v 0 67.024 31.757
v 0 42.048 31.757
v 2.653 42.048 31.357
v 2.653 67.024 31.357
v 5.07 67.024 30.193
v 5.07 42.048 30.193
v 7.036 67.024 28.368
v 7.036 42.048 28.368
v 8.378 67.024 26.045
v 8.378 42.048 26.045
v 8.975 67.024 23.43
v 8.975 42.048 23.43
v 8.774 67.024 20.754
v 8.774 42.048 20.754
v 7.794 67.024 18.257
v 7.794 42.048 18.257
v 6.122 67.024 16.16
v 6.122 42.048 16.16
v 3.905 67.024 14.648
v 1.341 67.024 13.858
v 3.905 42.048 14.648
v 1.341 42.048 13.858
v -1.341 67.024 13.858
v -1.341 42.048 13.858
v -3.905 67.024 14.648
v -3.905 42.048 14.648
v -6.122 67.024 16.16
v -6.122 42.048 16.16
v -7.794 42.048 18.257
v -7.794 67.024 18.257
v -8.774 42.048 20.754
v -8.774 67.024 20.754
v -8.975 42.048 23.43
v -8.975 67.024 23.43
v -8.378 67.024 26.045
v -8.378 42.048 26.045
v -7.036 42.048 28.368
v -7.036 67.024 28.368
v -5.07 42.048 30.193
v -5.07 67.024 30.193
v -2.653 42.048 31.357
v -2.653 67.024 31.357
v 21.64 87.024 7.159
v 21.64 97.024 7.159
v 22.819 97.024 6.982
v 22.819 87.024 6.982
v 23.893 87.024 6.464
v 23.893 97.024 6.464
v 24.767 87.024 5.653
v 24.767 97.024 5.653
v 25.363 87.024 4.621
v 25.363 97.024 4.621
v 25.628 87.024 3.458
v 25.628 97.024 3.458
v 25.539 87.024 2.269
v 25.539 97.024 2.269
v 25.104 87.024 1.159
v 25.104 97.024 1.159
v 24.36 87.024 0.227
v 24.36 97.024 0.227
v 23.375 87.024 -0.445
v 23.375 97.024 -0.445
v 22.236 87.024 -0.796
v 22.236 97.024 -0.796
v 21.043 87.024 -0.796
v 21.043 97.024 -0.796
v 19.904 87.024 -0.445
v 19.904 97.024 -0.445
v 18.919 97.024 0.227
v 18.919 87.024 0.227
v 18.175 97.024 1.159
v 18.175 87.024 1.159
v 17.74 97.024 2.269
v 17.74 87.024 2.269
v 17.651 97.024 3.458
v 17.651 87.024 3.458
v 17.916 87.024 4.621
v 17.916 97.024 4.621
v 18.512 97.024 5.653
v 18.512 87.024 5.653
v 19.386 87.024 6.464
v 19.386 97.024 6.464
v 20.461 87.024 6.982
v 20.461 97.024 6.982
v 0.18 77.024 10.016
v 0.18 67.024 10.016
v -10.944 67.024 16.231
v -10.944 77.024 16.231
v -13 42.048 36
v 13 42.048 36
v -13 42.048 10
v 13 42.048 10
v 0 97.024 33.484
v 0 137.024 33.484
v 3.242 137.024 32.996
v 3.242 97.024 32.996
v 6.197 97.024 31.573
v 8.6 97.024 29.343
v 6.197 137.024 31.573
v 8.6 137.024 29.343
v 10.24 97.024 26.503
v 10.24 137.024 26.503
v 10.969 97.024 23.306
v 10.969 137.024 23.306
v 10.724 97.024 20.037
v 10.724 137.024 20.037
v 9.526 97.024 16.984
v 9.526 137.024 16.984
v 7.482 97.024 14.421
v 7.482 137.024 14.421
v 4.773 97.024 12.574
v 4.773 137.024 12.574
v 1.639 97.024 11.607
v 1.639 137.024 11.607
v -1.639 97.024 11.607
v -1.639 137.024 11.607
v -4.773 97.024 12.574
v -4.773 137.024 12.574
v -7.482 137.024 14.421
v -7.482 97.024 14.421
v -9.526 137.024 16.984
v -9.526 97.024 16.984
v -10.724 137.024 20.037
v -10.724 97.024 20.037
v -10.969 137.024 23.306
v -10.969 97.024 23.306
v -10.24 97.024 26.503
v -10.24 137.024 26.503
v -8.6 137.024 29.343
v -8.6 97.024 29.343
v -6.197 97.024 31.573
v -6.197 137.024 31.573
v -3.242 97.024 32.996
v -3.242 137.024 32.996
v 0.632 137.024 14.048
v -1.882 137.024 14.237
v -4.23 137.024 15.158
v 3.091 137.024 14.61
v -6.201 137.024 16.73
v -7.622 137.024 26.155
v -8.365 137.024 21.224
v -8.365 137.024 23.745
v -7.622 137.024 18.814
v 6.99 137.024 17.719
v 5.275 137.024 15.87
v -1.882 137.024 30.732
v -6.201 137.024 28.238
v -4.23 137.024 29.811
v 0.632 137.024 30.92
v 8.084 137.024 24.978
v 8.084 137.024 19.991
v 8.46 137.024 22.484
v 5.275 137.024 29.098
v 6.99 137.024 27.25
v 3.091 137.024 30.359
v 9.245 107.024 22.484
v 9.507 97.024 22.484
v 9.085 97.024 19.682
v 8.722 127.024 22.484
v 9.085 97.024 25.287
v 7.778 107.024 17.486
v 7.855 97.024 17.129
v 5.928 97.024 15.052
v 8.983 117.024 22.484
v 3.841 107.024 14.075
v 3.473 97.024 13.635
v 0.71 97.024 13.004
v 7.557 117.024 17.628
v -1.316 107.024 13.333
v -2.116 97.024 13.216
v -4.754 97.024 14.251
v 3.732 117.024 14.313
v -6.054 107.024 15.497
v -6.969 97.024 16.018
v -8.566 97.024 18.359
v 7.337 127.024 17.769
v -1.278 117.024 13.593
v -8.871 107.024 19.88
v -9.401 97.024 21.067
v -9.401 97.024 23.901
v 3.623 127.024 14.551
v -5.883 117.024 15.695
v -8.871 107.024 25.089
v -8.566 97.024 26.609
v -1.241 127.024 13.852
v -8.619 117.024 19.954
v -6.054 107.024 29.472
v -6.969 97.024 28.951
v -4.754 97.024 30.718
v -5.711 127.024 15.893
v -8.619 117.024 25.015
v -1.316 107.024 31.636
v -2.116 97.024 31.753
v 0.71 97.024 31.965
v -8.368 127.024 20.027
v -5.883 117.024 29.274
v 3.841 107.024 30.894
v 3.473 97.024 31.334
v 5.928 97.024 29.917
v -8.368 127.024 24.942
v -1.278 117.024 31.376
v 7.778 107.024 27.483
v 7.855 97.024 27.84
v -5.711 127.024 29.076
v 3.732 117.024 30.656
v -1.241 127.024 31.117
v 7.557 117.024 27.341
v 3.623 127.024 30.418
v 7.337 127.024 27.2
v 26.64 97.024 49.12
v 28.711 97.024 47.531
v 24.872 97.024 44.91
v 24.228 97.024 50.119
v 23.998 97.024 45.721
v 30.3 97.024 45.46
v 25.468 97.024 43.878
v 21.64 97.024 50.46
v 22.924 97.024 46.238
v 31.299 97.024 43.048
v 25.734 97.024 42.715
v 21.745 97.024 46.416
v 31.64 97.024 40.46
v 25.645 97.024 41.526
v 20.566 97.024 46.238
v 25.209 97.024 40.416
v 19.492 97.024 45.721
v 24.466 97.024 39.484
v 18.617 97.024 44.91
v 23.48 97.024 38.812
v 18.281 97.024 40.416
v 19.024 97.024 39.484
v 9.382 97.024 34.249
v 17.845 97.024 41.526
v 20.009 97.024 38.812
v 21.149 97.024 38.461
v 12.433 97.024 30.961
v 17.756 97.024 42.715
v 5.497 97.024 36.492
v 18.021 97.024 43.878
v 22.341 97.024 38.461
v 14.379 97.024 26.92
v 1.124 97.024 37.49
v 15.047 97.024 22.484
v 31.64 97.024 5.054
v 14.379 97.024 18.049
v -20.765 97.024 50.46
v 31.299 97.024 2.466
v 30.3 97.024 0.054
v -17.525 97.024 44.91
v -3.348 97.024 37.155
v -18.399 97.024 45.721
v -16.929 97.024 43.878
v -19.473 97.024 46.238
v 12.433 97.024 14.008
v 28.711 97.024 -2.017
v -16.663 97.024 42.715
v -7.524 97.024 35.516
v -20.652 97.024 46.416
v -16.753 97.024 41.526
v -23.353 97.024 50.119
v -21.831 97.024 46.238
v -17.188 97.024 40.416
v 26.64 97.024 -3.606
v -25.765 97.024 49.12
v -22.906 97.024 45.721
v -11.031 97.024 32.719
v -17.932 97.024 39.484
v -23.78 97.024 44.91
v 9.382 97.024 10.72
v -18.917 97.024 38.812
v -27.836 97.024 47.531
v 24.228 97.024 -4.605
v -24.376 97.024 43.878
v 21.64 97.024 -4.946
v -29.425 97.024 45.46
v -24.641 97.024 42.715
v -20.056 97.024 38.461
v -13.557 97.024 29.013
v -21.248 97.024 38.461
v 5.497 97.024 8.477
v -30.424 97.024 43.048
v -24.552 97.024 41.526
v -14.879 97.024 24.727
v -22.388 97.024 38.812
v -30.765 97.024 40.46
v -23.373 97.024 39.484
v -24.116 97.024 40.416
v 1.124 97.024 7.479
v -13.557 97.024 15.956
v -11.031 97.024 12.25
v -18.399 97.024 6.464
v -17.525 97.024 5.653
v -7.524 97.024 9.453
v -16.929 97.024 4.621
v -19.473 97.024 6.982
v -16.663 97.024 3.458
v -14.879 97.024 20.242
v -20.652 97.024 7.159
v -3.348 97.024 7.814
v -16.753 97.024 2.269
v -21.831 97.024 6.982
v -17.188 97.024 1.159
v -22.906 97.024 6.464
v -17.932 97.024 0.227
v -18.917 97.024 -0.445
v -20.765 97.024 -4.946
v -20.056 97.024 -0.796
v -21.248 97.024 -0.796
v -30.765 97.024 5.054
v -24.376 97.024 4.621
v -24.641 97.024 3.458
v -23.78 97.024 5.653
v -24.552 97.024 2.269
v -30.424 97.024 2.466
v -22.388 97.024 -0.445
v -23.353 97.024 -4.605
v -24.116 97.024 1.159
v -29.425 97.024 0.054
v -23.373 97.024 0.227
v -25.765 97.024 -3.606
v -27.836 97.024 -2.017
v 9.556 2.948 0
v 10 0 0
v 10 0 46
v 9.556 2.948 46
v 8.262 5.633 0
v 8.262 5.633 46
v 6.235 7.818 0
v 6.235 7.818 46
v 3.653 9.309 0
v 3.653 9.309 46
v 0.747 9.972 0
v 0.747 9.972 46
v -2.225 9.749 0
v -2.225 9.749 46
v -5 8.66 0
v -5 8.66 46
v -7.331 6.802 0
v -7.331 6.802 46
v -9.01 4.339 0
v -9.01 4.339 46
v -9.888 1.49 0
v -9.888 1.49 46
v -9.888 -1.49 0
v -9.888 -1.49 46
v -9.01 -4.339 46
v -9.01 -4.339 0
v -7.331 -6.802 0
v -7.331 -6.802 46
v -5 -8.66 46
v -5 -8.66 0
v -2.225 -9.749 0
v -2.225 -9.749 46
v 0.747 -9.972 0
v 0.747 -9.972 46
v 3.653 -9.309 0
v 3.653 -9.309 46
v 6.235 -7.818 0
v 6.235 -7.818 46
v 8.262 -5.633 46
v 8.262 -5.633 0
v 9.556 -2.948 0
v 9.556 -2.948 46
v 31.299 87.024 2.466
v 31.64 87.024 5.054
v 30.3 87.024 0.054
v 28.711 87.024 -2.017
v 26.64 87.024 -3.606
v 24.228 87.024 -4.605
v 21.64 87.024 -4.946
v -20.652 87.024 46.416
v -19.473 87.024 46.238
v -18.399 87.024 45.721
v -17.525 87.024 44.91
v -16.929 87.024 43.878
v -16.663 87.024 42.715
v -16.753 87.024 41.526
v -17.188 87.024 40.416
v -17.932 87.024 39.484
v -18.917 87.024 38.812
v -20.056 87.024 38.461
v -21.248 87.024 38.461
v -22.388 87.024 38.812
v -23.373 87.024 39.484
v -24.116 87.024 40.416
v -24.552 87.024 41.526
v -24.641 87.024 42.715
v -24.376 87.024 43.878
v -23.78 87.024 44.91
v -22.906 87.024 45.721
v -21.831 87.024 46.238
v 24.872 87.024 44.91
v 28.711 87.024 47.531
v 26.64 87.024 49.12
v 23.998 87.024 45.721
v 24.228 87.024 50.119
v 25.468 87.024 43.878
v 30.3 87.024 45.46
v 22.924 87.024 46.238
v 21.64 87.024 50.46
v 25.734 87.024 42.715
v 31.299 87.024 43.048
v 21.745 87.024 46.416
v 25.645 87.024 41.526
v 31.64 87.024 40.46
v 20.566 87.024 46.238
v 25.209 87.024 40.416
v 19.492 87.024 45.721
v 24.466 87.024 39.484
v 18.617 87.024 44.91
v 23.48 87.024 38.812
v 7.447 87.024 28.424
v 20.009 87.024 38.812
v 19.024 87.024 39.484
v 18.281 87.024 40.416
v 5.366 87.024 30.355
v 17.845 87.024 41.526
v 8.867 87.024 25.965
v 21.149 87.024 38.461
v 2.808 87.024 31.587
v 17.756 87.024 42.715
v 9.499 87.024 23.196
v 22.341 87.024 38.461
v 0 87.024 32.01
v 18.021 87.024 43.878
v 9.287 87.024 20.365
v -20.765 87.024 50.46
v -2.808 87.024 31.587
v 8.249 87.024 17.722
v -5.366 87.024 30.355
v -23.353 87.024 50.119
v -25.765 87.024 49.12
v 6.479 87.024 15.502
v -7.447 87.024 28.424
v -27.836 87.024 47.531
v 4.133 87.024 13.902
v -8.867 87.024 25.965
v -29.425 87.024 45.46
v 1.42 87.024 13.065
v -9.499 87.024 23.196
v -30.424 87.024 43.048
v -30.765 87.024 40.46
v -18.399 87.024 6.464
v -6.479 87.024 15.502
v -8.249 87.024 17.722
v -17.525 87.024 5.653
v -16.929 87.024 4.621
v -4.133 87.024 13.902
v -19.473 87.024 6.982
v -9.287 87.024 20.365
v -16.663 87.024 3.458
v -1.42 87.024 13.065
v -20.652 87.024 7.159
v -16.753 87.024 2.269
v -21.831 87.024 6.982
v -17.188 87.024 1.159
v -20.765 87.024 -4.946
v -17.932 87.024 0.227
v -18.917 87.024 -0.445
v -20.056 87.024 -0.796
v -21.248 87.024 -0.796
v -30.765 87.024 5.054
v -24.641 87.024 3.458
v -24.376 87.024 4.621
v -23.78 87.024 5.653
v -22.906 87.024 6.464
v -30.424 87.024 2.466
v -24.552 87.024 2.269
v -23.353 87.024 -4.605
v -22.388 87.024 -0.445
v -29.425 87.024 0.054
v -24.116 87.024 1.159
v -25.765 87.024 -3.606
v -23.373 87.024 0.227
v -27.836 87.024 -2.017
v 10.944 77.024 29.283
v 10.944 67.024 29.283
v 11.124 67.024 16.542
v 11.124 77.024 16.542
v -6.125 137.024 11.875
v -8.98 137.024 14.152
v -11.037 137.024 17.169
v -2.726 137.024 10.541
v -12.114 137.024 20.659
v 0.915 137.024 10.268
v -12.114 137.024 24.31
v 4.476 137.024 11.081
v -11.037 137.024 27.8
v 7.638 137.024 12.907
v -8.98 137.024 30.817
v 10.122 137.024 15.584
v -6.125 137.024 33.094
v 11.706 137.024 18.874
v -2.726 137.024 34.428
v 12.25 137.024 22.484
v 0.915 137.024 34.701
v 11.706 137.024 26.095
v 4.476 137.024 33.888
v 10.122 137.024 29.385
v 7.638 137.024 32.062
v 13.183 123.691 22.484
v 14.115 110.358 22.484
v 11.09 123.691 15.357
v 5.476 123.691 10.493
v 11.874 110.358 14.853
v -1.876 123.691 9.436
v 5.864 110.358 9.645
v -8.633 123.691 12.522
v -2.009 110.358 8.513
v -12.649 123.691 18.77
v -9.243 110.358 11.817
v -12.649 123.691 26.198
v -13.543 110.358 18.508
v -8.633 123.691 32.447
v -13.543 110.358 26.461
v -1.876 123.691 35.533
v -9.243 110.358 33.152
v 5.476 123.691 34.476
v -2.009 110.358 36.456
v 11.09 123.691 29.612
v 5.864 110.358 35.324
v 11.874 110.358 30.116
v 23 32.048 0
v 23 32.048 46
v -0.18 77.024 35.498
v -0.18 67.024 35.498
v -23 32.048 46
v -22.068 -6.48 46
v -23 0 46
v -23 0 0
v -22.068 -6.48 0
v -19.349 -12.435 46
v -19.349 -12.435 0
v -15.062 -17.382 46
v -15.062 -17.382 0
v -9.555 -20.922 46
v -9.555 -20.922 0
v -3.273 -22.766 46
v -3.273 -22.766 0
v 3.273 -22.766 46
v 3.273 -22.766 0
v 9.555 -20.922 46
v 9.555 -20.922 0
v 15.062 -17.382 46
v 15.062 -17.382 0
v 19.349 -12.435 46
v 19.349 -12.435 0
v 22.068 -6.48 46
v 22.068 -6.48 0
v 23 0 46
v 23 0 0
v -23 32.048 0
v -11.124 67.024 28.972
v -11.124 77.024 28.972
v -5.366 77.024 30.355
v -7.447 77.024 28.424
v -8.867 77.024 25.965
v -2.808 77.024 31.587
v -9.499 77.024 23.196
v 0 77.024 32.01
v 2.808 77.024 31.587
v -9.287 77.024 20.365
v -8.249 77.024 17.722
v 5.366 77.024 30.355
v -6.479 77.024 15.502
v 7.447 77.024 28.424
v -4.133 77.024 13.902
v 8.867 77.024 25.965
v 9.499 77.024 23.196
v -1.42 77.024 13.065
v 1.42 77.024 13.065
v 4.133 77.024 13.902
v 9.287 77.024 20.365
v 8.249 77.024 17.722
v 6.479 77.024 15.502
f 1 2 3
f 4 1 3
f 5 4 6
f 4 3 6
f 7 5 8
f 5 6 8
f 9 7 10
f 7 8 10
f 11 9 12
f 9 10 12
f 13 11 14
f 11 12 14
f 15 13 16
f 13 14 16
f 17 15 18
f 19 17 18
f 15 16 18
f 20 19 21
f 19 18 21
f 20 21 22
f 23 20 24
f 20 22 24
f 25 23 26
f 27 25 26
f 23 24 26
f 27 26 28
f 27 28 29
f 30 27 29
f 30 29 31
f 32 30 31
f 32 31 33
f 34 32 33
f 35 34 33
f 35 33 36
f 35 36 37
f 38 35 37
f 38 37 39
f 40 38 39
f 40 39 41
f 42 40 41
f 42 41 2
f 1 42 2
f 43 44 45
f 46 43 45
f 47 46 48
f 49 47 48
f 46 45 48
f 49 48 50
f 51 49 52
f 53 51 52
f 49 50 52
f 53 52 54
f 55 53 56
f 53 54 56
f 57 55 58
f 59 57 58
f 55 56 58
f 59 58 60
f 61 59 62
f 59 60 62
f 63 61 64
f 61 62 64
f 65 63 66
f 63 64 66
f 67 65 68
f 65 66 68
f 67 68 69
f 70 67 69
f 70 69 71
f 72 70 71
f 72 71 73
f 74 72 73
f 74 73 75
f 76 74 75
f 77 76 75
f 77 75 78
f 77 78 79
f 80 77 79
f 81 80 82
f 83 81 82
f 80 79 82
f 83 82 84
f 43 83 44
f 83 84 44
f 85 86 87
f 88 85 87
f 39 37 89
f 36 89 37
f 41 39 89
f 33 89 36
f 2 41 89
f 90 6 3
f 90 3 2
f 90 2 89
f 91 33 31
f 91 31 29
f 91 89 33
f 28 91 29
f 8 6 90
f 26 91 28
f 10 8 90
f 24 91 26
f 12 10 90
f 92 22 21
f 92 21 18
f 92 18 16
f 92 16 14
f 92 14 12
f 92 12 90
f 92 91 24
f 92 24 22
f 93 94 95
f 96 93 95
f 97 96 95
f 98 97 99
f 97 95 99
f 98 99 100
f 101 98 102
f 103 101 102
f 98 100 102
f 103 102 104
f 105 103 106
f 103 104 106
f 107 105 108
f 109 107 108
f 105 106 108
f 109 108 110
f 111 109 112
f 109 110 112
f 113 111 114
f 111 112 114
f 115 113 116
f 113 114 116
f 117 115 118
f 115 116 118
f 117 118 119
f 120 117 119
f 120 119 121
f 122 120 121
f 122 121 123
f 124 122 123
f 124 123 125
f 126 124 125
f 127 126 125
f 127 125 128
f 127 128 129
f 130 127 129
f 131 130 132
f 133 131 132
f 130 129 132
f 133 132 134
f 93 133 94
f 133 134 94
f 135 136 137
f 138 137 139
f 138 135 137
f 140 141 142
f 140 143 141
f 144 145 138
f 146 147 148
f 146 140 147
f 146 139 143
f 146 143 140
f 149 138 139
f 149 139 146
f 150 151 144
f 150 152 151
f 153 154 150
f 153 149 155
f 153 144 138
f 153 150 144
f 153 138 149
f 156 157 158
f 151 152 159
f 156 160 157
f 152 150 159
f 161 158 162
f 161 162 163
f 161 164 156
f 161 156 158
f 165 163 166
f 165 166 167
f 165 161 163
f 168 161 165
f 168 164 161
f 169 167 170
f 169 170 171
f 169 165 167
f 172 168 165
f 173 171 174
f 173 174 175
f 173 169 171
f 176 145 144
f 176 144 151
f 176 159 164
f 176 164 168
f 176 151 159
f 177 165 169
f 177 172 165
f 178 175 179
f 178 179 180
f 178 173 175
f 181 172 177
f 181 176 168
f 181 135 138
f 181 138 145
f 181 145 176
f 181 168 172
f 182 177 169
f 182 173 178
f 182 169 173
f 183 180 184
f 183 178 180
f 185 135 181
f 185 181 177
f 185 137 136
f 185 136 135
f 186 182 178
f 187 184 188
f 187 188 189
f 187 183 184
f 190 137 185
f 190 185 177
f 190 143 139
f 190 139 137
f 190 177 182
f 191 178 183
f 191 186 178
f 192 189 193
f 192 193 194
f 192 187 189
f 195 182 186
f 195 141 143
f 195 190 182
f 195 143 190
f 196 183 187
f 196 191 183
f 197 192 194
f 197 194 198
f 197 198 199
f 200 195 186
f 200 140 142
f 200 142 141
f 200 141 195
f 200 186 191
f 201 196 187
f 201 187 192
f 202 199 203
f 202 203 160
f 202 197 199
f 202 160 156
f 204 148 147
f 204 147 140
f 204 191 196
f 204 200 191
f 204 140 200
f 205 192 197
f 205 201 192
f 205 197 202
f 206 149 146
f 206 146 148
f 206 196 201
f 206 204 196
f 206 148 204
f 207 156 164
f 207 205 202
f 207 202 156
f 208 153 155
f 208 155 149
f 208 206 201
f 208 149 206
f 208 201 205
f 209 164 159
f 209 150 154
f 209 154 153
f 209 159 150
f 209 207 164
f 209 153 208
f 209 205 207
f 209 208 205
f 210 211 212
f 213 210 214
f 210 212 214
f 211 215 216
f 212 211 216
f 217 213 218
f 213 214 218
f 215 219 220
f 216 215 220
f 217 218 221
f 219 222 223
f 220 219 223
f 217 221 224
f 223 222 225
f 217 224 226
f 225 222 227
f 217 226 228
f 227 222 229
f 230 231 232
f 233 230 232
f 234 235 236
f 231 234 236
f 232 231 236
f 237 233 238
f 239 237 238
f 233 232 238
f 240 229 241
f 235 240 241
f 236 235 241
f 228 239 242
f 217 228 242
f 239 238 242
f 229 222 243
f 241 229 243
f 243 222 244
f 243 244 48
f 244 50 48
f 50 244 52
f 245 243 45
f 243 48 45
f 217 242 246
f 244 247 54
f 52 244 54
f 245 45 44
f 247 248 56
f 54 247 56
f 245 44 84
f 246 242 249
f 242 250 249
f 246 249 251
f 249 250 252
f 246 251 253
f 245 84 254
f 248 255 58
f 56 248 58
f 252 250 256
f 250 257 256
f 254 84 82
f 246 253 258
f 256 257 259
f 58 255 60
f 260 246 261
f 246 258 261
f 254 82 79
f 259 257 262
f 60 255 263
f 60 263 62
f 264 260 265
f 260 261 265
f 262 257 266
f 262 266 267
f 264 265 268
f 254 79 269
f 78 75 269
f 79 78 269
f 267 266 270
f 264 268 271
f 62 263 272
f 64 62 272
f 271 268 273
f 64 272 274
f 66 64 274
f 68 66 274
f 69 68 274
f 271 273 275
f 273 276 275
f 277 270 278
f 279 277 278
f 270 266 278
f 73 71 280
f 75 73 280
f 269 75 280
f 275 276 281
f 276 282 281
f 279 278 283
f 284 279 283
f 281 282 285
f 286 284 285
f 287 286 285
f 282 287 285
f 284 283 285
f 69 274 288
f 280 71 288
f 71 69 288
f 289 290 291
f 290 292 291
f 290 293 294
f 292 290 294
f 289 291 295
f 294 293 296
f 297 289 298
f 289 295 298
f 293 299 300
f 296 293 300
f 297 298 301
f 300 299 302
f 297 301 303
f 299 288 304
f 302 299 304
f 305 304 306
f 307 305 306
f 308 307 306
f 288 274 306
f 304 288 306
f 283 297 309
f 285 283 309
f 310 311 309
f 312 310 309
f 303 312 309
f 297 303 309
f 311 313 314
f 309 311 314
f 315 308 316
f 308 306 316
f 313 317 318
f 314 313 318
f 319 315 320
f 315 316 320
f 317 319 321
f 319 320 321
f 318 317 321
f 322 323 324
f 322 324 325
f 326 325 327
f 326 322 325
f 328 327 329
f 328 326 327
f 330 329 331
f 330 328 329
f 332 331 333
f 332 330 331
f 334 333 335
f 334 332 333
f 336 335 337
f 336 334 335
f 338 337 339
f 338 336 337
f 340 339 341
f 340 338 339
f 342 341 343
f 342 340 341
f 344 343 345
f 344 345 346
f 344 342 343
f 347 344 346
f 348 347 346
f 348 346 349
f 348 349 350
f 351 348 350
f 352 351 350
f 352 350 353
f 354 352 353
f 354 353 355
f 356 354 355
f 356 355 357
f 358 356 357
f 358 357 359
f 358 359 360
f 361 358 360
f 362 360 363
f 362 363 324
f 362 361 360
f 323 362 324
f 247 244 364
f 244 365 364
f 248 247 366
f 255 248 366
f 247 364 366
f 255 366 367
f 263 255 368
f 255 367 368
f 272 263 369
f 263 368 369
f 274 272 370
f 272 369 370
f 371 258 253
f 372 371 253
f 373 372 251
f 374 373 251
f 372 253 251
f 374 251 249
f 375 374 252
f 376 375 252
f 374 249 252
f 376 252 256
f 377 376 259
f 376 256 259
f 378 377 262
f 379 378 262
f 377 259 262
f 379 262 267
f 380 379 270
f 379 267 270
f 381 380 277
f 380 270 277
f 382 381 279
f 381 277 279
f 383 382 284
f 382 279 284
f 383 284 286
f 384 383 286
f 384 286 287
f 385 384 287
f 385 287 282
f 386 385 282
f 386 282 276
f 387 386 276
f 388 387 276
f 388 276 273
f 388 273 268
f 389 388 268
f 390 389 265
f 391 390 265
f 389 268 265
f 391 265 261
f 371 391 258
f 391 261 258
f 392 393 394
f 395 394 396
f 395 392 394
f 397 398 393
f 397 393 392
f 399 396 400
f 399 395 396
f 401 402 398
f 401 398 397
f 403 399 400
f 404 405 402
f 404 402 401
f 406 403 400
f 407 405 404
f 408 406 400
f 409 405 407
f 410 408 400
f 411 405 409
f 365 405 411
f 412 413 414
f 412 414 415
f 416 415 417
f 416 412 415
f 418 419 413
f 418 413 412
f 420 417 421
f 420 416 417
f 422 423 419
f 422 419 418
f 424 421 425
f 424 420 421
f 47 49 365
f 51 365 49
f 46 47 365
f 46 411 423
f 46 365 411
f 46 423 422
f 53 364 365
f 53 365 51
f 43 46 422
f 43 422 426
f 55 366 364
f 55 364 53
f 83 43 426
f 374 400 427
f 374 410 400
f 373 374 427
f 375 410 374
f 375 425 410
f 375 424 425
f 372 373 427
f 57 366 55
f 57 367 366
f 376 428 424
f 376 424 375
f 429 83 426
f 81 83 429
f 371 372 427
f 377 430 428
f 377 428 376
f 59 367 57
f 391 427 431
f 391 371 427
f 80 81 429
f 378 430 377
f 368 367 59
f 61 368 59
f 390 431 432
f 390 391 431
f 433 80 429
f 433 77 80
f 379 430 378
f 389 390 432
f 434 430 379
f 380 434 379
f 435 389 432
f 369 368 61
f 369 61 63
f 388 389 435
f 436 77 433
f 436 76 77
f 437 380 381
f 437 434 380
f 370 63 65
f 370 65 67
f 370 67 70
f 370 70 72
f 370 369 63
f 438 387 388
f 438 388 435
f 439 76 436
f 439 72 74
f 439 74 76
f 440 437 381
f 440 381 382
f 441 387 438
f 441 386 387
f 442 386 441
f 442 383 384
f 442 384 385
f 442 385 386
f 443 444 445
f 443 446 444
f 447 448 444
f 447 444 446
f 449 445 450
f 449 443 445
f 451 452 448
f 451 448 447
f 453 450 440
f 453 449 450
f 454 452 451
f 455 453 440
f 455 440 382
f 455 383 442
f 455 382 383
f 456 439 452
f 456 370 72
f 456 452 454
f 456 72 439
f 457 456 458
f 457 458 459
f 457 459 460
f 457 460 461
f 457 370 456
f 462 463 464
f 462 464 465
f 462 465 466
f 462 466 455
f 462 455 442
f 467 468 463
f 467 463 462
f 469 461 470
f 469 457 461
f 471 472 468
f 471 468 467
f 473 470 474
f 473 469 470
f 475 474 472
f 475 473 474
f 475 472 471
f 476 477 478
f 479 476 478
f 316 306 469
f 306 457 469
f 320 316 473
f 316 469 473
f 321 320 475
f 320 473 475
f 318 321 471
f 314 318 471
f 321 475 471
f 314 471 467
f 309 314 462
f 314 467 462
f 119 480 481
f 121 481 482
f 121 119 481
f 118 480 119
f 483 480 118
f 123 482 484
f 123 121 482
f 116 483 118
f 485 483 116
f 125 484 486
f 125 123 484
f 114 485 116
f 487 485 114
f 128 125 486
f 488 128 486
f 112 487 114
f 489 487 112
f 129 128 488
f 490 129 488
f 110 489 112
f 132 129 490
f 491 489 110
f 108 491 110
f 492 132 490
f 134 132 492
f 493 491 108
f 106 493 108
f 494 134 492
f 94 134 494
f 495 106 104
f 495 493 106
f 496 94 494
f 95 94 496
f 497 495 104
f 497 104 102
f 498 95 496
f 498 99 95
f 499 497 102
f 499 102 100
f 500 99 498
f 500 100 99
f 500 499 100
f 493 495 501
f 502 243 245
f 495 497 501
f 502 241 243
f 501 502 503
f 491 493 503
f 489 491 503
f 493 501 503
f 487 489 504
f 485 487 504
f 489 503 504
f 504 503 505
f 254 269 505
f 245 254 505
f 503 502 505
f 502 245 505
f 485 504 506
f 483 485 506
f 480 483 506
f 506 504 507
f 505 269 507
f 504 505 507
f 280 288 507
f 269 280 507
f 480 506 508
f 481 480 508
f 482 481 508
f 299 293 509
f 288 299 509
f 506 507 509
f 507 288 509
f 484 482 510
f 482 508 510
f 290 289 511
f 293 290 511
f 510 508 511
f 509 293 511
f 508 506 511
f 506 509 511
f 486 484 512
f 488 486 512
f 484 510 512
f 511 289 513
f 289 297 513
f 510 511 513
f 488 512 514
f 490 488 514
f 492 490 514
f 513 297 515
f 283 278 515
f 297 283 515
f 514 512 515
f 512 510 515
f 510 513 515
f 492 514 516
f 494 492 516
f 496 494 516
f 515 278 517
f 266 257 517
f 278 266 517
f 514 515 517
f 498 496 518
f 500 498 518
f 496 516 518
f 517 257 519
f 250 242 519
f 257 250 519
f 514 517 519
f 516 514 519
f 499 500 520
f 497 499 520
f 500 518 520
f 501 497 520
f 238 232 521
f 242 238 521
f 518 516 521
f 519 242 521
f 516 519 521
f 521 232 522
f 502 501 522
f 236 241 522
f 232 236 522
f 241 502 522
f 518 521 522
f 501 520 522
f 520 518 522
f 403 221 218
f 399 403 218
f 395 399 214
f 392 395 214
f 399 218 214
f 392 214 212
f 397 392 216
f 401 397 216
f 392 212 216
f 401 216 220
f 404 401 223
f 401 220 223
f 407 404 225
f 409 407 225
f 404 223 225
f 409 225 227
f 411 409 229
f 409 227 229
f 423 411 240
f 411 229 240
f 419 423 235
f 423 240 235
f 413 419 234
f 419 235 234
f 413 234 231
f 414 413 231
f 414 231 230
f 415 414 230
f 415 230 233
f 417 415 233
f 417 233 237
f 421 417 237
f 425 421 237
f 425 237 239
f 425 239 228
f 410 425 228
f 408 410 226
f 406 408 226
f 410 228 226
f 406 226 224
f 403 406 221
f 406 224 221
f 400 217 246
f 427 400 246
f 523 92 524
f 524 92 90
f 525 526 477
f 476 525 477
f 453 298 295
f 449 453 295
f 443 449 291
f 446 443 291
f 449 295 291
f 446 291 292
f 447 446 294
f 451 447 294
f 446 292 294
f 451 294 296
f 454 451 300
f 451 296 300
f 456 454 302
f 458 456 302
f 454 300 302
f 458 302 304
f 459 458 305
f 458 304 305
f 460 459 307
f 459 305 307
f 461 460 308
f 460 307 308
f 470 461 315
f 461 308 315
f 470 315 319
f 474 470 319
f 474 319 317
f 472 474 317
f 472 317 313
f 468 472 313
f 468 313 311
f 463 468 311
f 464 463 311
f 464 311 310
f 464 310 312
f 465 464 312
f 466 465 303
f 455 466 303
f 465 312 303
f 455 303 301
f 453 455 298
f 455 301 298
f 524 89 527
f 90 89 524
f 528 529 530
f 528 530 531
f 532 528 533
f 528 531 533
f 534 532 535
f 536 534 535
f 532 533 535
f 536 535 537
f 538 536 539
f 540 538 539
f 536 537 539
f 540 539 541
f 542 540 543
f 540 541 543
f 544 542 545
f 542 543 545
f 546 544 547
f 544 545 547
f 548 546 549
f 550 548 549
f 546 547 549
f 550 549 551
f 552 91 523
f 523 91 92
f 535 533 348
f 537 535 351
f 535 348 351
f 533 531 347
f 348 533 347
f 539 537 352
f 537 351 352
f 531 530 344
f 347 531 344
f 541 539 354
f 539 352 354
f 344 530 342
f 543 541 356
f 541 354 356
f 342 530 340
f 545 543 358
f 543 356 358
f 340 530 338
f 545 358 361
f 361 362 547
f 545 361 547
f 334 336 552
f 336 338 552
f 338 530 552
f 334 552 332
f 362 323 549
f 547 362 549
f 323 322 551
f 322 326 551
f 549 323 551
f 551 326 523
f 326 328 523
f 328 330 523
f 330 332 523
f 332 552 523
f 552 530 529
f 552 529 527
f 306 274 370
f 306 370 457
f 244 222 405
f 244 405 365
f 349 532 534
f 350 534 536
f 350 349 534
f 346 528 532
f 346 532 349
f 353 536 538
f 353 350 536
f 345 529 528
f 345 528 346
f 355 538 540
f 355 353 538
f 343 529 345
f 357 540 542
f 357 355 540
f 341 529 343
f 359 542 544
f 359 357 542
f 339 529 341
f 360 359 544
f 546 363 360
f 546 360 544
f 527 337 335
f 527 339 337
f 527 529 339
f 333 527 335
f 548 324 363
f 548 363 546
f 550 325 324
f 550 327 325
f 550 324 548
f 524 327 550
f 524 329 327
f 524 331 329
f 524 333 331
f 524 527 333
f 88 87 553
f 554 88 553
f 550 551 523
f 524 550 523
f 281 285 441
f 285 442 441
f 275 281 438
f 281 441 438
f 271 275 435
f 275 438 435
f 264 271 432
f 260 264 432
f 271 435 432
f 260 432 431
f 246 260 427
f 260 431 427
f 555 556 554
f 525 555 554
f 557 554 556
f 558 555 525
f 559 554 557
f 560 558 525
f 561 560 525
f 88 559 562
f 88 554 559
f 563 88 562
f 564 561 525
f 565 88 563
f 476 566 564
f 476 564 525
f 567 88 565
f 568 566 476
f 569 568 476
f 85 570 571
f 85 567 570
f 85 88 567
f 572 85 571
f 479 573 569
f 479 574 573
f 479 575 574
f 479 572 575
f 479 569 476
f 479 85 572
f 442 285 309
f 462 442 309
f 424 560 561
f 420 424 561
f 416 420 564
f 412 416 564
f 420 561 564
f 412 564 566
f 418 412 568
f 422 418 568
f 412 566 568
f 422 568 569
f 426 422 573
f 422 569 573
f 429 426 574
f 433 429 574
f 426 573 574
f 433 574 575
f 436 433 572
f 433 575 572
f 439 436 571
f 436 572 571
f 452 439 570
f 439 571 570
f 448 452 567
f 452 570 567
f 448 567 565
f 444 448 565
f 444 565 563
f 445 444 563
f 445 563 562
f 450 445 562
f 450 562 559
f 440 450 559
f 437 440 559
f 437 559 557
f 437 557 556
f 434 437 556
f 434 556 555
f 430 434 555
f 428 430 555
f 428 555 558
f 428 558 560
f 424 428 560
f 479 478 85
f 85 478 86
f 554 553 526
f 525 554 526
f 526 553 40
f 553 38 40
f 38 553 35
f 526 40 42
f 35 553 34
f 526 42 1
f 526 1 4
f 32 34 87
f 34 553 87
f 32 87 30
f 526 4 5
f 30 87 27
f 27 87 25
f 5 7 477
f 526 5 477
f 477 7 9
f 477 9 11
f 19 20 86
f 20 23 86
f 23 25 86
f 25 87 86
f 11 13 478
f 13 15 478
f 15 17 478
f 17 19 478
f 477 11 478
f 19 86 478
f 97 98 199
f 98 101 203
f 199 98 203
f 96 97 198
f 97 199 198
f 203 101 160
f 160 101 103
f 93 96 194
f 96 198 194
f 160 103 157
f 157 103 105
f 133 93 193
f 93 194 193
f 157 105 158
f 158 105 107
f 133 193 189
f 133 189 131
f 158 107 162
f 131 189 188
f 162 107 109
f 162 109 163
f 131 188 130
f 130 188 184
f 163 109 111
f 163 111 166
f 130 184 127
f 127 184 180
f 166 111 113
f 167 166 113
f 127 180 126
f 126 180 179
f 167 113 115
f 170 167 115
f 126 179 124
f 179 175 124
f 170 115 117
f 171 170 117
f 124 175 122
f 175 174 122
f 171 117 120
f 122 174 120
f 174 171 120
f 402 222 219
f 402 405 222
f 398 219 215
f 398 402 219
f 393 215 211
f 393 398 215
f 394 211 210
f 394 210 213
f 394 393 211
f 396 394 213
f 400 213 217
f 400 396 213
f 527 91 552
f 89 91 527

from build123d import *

# Parameters (mm, degrees)
SKETCH1_R           = 10
SKETCH1_W           = 46
SKETCH1_H           = 19.048435613
BOSS_EXTRUDE1_DEPTH = 46
CHAMFER1_SIZE       = 10
SKETCH2_R           = 9
BOSS_EXTRUDE2_DEPTH = 46
BOSS_EXTRUDE4_DEPTH = 10
SKETCH6_R           = 9.525638377
BOSS_EXTRUDE5_DEPTH = 10
SKETCH8_R           = 8.459669001
BOSS_EXTRUDE6_DEPTH = 50
DRAFT1_ANGLE        = 1
SKETCH9_R           = 14
SKETCH9_R_2         = 11
BOSS_EXTRUDE8_DEPTH = 40
DRAFT10_ANGLE       = 1.5
SKETCH12_W          = 62.404350154
SKETCH12_H          = 55.405731445
BOSS_EXTRUDE9_DEPTH = 10
FILLET1_R           = 10
FILLET2_R           = 10
SKETCH13_R          = 4
CUT_EXTRUDE3_DEPTH  = 10
DRAFT11_ANGLE       = 2
DRAFT12_ANGLE       = 4
DRAFT13_ANGLE       = 1
DRAFT14_ANGLE       = 1.5


# Read off the part's stored shape, not the designer's step: Draft7, Draft16
with BuildPart() as part:
    # Sketch1 → Boss-Extrude1 (new body)
    # profile 1 of 2: a face of its own
    with BuildSketch(Plane.XY):
        with BuildLine():
            Line((-23, 23), (-23, 0))
            ThreePointArc((-23, 0), (0, -23), (23, 0))
            Line((23, 0), (23, 23))
            Line((23, 23), (-23, 23))
        make_face()
        Circle(SKETCH1_R, mode=Mode.SUBTRACT)
    # profile 2 of 2: a face of its own
    with BuildSketch(Plane.XY):
        with Locations((0, 32.524217807)):
            Rectangle(SKETCH1_W, SKETCH1_H)
    extrude(amount=BOSS_EXTRUDE1_DEPTH)

    # Chamfer1
    chamfer1_edges = [part.edges().sort_by_distance(p)[0] for p in [
        (-23, 42.048435613, 23),
        (23, 42.048435613, 23),
        (0, 42.048435613, 46),
        (0, 42.048435613, 0),
    ]]
    chamfer(chamfer1_edges, length=CHAMFER1_SIZE)

    # Sketch2 → Boss-Extrude2 (add)
    with BuildSketch(Plane(origin=(0, 21.024217806, 0), x_dir=(1, 0, 0), z_dir=(0, 1, 0))):
        with Locations(Location((0, -22.756992406, 0), (0, 0, 270))):
            Circle(SKETCH2_R)
    extrude(amount=BOSS_EXTRUDE2_DEPTH)

    # Sketch5 → Boss-Extrude4 (add)
    with BuildSketch(Plane(origin=(0, 67.024217806, 0), x_dir=(1, 0, 0), z_dir=(0, 1, 0))):
        Polygon((10.943751373, -29.282952175), (11.123522631, -16.542405589), (0.179771258, -10.01644582), (-10.943751373, -16.231032637), (-11.123522631, -28.971579223), (-0.179771258, -35.497538992), align=None)
    extrude(amount=BOSS_EXTRUDE4_DEPTH)

    # Sketch6 → Boss-Extrude5 (add)
    with BuildSketch(Plane(origin=(0, 77.024217806, 0), x_dir=(1, 0, 0), z_dir=(0, 1, 0))):
        with Locations(Location((0, -22.484455751, 0), (0, 0, 270))):
            Circle(SKETCH6_R)
    extrude(amount=BOSS_EXTRUDE5_DEPTH)

    # Sketch8 → Boss-Extrude6 (add)
    with BuildSketch(Plane(origin=(0, 87.024217806, 0), x_dir=(1, 0, 0), z_dir=(0, 1, 0))):
        with Locations(Location((0, -22.484455751, 0), (0, 0, 270))):
            Circle(SKETCH8_R)
    extrude(amount=BOSS_EXTRUDE6_DEPTH)

    # Draft1
    draft1_faces = [part.faces().sort_by_distance(p)[0] for p in [
        (0, 112.024217806, 14.02478675),
    ]]
    draft(draft1_faces, Plane(origin=(0, 137.024217806, 22.484455751), x_dir=(0, 0, 1), z_dir=(0, 1, 0)), DRAFT1_ANGLE)

    # Draft7 outline → Draft7 (revolve)
    with BuildSketch(Plane.XY.offset(22.484455751)):
        Polygon((9.525638377, 87.024217806), (9.525638377, 96.316489669), (8.459669001, 137.024217806), (9.332422247, 87.024217806), align=None)
    revolve(axis=Axis((0, 0, 22.484455751), (0, 1, 0)))



with BuildPart() as body_2:
    # Sketch9 → Boss-Extrude8 (new body)
    with BuildSketch(Plane(origin=(0, 137.024217806, 0), x_dir=(1, 0, 0), z_dir=(0, 1, 0))):
        with Locations(Location((0, -22.484455751, 0), (0, 0, 270))):
            Circle(SKETCH9_R)
        with Locations(Location((0, -22.484455751, 0), (0, 0, 270))):
            Circle(SKETCH9_R_2, mode=Mode.SUBTRACT)
    extrude(amount=-BOSS_EXTRUDE8_DEPTH)

    # Draft10
    draft10_faces = [body_2.faces().sort_by_distance(p)[0] for p in [
        (0, 117.024217806, 8.484455751),
    ]]
    draft(draft10_faces, Plane(origin=(0, 137.024217806, 22.484455751), x_dir=(0, 0, 1), z_dir=(0, 1, 0)), DRAFT10_ANGLE)


with BuildPart() as part_1:
    add(part.part)

    add(body_2.part)  # Boss-Extrude9 merges body 2
    # Sketch12 → Boss-Extrude9 (add)
    with BuildSketch(Plane(origin=(0, 97.024217806, 0), x_dir=(-1, 0, 0), z_dir=(0, -1, 0))):
        with Locations((-0.437413669, -22.756992406)):
            Rectangle(SKETCH12_W, SKETCH12_H)
    extrude(amount=BOSS_EXTRUDE9_DEPTH)

    # Fillet1
    fillet1_edges = [part_1.edges().sort_by_distance(p)[0] for p in [
        (-30.764761408, 92.024217806, 50.459858128),
        (31.639588746, 92.024217806, -4.945873317),
        (31.639588746, 92.024217806, 50.459858128),
    ]]
    fillet(fillet1_edges, radius=FILLET1_R)

    # Fillet2
    fillet2_edges = [part_1.edges().sort_by_distance(p)[0] for p in [
        (-30.764761408, 92.024217806, -4.945873317),
    ]]
    fillet(fillet2_edges, radius=FILLET2_R)

    # Sketch13 → Cut-Extrude3 (cut)
    with BuildSketch(Plane(origin=(0, 97.024217806, 0), x_dir=(1, 0, 0), z_dir=(0, 1, 0))):
        with Locations(Location((-20.652282418, -42.41614068, 0), (0, 0, 270))):
            Circle(SKETCH13_R)
        with Locations(Location((21.744824706, -42.41614068, 0), (0, 0, 270))):
            Circle(SKETCH13_R)
        with Locations(Location((-20.652282418, -3.159218326, 0), (0, 0, 270))):
            Circle(SKETCH13_R)
        with Locations(Location((21.639588746, -3.159218326, 0), (0, 0, 270))):
            Circle(SKETCH13_R)
    extrude(amount=-CUT_EXTRUDE3_DEPTH, mode=Mode.SUBTRACT)

    # Draft11
    draft11_faces = [part_1.faces().sort_by_distance(p)[0] for p in [
        (0, 117.024217806, 7.960737319),
    ]]
    draft(draft11_faces, Plane(origin=(0, 137.024217806, 22.484455751), x_dir=(0, 0, 1), z_dir=(0, 1, 0)), DRAFT11_ANGLE)

    # Draft12
    draft12_faces = [part_1.faces().sort_by_distance(p)[0] for p in [
        (0, 117.024217806, 7.786040361),
    ]]
    draft(draft12_faces, Plane(origin=(0, 137.024217806, 22.484455751), x_dir=(0, 0, 1), z_dir=(0, 1, 0)), DRAFT12_ANGLE)

    # Draft13
    draft13_faces = [part_1.faces().sort_by_distance(p)[0] for p in [
        (0, 117.024217806, 7.085919512),
    ]]
    draft(draft13_faces, Plane(origin=(0, 137.024217806, 22.484455751), x_dir=(0, 0, 1), z_dir=(0, 1, 0)), DRAFT13_ANGLE)

    # Draft14
    draft14_faces = [part_1.faces().sort_by_distance(p)[0] for p in [
        (0, 117.024217806, 8.135354452),
    ]]
    draft(draft14_faces, Plane(origin=(0, 137.024217806, 22.484455751), x_dir=(0, 0, 1), z_dir=(0, 1, 0)), DRAFT14_ANGLE)

    # Draft16 outline → Draft16 (revolve, cut)
    with BuildSketch(Plane.XY.offset(22.484455751)):
        Polygon((14, 137.024217806), (12.250364385, 137.024217806), (15.047436863, 97.024217806), align=None)
    revolve(axis=Axis((0, 0, 22.484455751), (0, 1, 0)), mode=Mode.SUBTRACT)


solid = part_1.part
